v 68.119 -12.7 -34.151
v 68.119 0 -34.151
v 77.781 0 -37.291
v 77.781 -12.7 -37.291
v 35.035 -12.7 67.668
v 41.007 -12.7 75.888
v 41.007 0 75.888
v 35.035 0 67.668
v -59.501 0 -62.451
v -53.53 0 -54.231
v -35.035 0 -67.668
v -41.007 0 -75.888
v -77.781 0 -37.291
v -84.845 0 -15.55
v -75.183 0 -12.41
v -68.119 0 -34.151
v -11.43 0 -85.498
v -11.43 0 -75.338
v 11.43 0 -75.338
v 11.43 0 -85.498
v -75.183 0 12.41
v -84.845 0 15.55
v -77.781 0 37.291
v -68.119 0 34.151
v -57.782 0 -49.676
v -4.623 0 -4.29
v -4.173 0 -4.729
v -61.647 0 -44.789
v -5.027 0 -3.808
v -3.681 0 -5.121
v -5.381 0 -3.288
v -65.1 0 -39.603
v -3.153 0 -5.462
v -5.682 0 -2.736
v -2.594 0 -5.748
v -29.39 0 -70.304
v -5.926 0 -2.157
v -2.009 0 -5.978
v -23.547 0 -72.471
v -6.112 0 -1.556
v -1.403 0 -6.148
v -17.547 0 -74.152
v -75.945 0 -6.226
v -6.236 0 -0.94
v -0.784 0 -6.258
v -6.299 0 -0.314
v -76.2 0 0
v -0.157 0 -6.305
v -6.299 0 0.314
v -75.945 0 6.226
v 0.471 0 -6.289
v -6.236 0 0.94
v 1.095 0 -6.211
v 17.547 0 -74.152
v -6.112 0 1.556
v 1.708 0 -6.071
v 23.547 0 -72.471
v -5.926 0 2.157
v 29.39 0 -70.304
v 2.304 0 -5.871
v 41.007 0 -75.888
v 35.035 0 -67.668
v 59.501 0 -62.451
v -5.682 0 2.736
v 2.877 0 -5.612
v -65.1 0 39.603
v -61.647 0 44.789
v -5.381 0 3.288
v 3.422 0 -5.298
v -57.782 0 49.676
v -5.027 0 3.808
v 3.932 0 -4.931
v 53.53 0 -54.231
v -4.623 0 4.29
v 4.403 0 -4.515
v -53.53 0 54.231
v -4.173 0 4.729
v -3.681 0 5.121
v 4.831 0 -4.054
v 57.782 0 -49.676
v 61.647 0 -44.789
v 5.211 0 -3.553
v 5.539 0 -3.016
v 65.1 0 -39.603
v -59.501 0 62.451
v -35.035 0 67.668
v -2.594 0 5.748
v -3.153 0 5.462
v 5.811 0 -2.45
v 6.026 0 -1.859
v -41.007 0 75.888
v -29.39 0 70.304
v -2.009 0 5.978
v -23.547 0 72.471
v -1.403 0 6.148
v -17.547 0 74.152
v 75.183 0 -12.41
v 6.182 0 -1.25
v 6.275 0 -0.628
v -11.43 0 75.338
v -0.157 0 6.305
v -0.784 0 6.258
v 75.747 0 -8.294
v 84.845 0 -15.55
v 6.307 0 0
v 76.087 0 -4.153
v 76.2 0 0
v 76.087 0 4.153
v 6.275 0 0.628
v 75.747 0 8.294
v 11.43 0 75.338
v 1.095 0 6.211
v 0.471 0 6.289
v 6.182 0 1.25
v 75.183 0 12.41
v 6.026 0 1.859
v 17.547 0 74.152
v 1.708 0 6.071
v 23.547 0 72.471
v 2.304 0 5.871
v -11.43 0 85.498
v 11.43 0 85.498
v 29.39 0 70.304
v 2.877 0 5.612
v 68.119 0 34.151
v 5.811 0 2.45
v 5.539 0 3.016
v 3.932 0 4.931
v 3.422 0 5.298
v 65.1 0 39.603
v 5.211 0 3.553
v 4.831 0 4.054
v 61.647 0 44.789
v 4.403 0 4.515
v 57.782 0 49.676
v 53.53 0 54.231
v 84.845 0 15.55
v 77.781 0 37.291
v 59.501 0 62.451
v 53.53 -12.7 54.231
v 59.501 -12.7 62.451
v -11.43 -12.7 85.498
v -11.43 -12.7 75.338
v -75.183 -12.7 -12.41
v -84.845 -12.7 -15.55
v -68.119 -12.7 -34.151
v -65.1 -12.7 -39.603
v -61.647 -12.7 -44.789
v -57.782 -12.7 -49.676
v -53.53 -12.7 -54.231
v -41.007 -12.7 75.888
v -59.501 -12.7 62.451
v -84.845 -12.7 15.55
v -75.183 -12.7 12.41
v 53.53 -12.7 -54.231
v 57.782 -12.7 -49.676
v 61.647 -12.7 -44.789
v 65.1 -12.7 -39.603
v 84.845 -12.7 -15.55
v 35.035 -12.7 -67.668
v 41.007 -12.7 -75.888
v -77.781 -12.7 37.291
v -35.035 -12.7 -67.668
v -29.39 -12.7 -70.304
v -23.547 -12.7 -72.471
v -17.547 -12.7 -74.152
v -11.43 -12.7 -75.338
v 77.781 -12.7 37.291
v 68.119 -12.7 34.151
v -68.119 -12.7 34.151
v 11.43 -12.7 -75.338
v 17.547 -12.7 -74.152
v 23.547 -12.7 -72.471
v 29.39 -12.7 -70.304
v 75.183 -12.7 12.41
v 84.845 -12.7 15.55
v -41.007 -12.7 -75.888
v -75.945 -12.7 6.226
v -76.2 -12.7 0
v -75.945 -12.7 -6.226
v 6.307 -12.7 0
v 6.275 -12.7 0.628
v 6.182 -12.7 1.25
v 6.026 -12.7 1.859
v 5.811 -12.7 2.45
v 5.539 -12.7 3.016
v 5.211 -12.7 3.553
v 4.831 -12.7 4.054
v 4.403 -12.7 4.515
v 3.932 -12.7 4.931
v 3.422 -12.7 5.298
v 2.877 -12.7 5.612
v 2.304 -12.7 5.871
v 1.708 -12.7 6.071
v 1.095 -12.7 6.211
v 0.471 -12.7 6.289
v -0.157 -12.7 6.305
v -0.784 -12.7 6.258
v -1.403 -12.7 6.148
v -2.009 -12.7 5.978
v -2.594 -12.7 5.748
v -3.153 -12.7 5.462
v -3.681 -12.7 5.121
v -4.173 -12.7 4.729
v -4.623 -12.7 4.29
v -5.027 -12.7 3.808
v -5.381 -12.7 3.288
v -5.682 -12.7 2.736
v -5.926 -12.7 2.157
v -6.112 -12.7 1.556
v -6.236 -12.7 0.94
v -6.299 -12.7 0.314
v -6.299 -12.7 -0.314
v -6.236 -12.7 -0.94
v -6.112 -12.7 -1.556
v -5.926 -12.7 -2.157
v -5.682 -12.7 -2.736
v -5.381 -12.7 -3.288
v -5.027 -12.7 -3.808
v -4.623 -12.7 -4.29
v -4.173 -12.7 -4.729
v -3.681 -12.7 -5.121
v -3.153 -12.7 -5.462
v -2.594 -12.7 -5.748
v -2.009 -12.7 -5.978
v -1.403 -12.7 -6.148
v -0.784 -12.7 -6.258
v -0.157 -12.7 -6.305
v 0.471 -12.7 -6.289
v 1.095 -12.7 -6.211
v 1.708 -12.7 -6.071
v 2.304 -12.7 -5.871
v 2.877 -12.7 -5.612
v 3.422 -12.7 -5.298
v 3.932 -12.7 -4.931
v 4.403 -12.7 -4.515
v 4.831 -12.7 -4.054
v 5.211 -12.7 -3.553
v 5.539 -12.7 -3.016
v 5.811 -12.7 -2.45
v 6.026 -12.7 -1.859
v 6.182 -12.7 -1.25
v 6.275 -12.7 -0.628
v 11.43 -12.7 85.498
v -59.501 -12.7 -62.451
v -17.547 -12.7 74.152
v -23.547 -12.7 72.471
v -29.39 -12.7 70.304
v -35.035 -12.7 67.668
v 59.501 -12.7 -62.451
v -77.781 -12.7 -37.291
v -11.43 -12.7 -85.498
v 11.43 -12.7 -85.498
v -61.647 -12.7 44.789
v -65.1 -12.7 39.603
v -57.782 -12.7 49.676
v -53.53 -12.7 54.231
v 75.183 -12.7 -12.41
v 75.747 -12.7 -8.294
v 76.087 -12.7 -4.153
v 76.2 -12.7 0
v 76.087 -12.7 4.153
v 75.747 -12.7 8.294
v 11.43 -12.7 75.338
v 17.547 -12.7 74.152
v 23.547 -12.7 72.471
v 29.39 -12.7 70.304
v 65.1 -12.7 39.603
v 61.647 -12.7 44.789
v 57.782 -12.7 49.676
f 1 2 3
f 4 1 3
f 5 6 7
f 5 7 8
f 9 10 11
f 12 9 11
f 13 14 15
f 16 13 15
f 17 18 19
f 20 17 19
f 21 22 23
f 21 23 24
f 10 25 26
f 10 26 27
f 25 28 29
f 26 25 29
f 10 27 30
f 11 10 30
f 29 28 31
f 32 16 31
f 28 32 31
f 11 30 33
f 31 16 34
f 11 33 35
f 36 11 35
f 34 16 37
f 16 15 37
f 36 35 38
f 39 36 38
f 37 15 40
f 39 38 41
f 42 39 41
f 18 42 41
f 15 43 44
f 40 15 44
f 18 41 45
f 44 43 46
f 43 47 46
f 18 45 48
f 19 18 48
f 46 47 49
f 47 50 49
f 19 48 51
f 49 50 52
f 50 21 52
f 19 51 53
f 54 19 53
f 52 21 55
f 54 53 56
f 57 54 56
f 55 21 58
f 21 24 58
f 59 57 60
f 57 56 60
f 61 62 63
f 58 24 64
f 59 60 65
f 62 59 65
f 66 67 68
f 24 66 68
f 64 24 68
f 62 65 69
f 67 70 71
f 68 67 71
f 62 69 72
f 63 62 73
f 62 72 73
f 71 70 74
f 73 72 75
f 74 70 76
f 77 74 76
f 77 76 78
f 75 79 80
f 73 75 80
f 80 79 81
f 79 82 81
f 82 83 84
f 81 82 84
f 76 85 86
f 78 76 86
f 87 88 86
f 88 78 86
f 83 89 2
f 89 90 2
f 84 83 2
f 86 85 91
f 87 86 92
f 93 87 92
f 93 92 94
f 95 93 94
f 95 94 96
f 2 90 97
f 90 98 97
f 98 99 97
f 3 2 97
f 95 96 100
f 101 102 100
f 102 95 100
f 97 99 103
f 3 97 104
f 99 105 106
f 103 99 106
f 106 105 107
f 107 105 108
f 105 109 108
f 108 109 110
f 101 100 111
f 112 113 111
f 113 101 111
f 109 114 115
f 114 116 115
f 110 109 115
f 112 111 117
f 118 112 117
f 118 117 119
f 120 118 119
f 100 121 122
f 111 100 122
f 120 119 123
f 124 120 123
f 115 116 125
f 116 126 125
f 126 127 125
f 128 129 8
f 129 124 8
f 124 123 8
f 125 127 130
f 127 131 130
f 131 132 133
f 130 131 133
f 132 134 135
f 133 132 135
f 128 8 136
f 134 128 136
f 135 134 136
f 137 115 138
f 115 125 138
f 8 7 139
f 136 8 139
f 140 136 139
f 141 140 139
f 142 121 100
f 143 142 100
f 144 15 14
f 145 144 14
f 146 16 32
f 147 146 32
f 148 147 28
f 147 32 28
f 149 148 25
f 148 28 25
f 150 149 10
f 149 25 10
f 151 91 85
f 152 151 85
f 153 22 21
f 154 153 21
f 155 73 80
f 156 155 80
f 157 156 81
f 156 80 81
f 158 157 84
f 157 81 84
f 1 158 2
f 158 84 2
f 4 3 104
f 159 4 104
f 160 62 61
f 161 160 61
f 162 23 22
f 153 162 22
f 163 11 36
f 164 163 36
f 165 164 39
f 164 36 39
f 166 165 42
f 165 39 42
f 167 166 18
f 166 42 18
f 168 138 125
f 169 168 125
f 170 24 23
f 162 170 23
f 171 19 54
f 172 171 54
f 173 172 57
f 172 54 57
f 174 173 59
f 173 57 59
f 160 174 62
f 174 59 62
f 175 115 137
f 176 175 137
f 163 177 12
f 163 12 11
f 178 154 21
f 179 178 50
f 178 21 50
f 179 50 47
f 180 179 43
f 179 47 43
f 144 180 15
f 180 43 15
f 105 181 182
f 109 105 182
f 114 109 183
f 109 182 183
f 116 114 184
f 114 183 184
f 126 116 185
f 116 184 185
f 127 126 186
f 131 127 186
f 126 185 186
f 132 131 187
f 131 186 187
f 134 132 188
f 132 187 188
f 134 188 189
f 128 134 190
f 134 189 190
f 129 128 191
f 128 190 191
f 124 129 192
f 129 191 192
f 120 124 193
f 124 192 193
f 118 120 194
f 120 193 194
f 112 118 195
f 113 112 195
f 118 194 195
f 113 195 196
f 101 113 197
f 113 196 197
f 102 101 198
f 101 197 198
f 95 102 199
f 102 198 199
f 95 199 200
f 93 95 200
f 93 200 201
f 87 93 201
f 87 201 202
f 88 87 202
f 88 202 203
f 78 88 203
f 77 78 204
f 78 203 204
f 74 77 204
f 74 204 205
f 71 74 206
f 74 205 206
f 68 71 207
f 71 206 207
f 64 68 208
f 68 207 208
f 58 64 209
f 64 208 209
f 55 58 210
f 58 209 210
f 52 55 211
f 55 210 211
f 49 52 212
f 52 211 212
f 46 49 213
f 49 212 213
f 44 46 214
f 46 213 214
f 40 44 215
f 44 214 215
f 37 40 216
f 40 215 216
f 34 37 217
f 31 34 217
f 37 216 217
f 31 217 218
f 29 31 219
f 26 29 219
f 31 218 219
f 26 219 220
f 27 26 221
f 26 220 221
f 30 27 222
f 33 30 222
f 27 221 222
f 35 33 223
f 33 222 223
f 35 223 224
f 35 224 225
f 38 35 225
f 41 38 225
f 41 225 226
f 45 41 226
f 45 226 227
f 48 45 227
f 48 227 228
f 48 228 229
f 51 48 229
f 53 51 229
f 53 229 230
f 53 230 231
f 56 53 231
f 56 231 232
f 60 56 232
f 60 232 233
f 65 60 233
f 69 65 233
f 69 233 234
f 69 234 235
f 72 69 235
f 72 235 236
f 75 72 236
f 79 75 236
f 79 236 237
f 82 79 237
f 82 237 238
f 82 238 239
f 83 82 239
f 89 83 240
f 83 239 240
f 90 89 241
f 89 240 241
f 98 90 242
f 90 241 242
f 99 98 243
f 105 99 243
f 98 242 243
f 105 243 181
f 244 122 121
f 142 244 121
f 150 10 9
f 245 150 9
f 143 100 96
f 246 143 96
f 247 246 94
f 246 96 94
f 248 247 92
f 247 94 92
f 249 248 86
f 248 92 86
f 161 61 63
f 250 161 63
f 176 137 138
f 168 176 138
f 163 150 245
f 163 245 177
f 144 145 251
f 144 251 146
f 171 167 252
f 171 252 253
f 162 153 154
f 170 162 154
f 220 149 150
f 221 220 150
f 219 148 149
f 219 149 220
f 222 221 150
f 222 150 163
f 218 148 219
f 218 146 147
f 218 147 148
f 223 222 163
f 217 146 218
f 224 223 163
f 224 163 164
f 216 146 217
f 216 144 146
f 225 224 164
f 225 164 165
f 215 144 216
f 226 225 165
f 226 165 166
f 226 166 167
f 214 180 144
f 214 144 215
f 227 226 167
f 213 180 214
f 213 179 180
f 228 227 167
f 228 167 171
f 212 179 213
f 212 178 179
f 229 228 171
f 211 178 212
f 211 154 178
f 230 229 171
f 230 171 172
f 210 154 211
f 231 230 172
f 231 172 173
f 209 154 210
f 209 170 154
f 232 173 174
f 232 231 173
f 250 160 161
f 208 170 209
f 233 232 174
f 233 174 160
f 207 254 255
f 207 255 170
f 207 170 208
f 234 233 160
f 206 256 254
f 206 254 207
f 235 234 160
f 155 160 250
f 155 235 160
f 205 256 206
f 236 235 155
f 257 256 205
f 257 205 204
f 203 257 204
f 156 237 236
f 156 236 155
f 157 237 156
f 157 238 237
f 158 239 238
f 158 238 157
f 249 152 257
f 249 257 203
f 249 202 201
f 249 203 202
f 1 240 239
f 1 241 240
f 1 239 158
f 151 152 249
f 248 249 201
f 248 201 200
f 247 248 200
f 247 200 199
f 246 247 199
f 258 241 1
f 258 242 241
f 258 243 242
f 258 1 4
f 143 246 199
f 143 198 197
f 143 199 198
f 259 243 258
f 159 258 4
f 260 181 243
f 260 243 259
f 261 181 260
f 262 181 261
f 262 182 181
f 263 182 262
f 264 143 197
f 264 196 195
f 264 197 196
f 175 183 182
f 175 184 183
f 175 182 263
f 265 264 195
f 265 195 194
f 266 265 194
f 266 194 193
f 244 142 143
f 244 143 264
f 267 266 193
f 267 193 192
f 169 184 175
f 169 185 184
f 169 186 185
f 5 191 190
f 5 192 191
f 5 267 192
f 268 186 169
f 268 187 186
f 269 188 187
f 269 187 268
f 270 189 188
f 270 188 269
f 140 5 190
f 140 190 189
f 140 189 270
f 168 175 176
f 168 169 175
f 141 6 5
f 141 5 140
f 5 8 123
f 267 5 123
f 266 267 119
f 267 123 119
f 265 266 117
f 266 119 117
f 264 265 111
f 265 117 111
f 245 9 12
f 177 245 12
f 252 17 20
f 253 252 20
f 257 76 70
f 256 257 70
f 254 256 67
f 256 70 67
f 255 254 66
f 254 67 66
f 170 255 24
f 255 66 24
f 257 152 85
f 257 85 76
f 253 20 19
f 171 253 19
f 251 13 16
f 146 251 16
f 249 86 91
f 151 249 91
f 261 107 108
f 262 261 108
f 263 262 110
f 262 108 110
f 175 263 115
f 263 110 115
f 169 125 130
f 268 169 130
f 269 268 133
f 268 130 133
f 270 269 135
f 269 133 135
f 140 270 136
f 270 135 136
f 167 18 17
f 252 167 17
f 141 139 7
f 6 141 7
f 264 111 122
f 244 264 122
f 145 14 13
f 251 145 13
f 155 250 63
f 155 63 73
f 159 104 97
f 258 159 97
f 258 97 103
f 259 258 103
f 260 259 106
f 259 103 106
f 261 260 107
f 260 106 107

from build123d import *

# Parameters (mm, degrees)
F1_DEPTH = 12.7
F2_R     = 6.3065615495
F3_DEPTH = 12.7


with BuildPart() as f1:
    # F0 (on Front) → F1 (new body)
    with BuildSketch(Plane.XZ):
        with BuildLine():
            ThreePointArc((75.1826392346, -12.4101070791), (75.9452339179, -6.2258690285), (76.2, 0))
            ThreePointArc((76.2, 0), (75.9452339179, 6.2258690285), (75.1826392346, 12.4101070791))
            ThreePointArc((75.1826392346, 12.4101070791), (72.4705065417, 23.5470949714), (68.1185107432, 34.1512590416))
            ThreePointArc((68.1185107432, 34.1512590416), (61.6470949714, 44.7892362247), (53.5295549023, 54.2312340995))
            ThreePointArc((53.5295549023, 54.2312340995), (44.7892362247, 61.6470949714), (35.0354264109, 67.6680049669))
            ThreePointArc((35.0354264109, 67.6680049669), (23.5470949714, 72.4705065417), (11.43, 75.3378729458))
            Line((11.43, 75.3378729458), (-11.43, 75.3378729458))
            ThreePointArc((-11.43, 75.3378729458), (-23.5470949714, 72.4705065417), (-35.0354264109, 67.6680049669))
            ThreePointArc((-35.0354264109, 67.6680049669), (-44.7892362247, 61.6470949714), (-53.5295549023, 54.2312340995))
            ThreePointArc((-53.5295549023, 54.2312340995), (-61.6470949714, 44.7892362247), (-68.1185107432, 34.1512590416))
            ThreePointArc((-68.1185107432, 34.1512590416), (-72.4705065417, 23.5470949714), (-75.1826392346, 12.4101070791))
            ThreePointArc((-75.1826392346, 12.4101070791), (-76.2, 0), (-75.1826392346, -12.4101070791))
            ThreePointArc((-75.1826392346, -12.4101070791), (-72.4705065417, -23.5470949714), (-68.1185107432, -34.1512590416))
            ThreePointArc((-68.1185107432, -34.1512590416), (-61.6470949714, -44.7892362247), (-53.5295549023, -54.2312340995))
            ThreePointArc((-53.5295549023, -54.2312340995), (-44.7892362247, -61.6470949714), (-35.0354264109, -67.6680049669))
            ThreePointArc((-35.0354264109, -67.6680049669), (-23.5470949714, -72.4705065417), (-11.43, -75.3378729458))
            ThreePointArc((-11.43, -75.3378729458), (0, -76.2), (11.43, -75.3378729458))
            ThreePointArc((11.43, -75.3378729458), (23.5470949714, -72.4705065417), (35.0354264109, -67.6680049669))
            ThreePointArc((35.0354264109, -67.6680049669), (44.7892362247, -61.6470949714), (53.5295549023, -54.2312340995))
            ThreePointArc((53.5295549023, -54.2312340995), (61.6470949714, -44.7892362247), (68.1185107432, -34.1512590416))
            ThreePointArc((68.1185107432, -34.1512590416), (72.4705065417, -23.5470949714), (75.1826392346, -12.4101070791))
        make_face()
        with BuildLine():
            ThreePointArc((68.1185107432, 34.1512590416), (72.4705065417, 23.5470949714), (75.1826392346, 12.4101070791))
            Line((75.1826392346, 12.4101070791), (84.8453734402, 15.5497197419))
            Line((84.8453734402, 15.5497197419), (77.7812449488, 37.2908717044))
            Line((77.7812449488, 37.2908717044), (68.1185107432, 34.1512590416))
        make_face()
        with BuildLine():
            Line((84.8453734402, -15.5497197419), (75.1826392346, -12.4101070791))
            ThreePointArc((75.1826392346, -12.4101070791), (72.4705065417, -23.5470949714), (68.1185107432, -34.1512590416))
            Line((68.1185107432, -34.1512590416), (77.7812449488, -37.2908717044))
            Line((77.7812449488, -37.2908717044), (84.8453734402, -15.5497197419))
        make_face()
        with BuildLine():
            ThreePointArc((35.0354264109, 67.6680049669), (44.7892362247, 61.6470949714), (53.5295549023, 54.2312340995))
            Line((53.5295549023, 54.2312340995), (59.5014530656, 62.4508467624))
            Line((59.5014530656, 62.4508467624), (41.0073245742, 75.8876176298))
            Line((41.0073245742, 75.8876176298), (35.0354264109, 67.6680049669))
        make_face()
        with BuildLine():
            Line((59.5014530656, -62.4508467624), (53.5295549023, -54.2312340995))
            ThreePointArc((53.5295549023, -54.2312340995), (44.7892362247, -61.6470949714), (35.0354264109, -67.6680049669))
            Line((35.0354264109, -67.6680049669), (41.0073245742, -75.8876176298))
            Line((41.0073245742, -75.8876176298), (59.5014530656, -62.4508467624))
        make_face()
        with BuildLine():
            Line((-11.43, 75.3378729458), (11.43, 75.3378729458))
            ThreePointArc((11.43, 75.3378729458), (0, 76.2), (-11.43, 75.3378729458))
        make_face()
        with BuildLine():
            ThreePointArc((-11.43, 75.3378729458), (0, 76.2), (11.43, 75.3378729458))
            Line((11.43, 75.3378729458), (11.43, 85.4978729458))
            Line((11.43, 85.4978729458), (-11.43, 85.4978729458))
            Line((-11.43, 85.4978729458), (-11.43, 75.3378729458))
        make_face()
        with BuildLine():
            Line((11.43, -85.4978729458), (11.43, -75.3378729458))
            ThreePointArc((11.43, -75.3378729458), (0, -76.2), (-11.43, -75.3378729458))
            Line((-11.43, -75.3378729458), (-11.43, -85.4978729458))
            Line((-11.43, -85.4978729458), (11.43, -85.4978729458))
        make_face()
        with BuildLine():
            ThreePointArc((-53.5295549023, 54.2312340995), (-44.7892362247, 61.6470949714), (-35.0354264109, 67.6680049669))
            Line((-35.0354264109, 67.6680049669), (-41.0073245742, 75.8876176298))
            Line((-41.0073245742, 75.8876176298), (-59.5014530656, 62.4508467624))
            Line((-59.5014530656, 62.4508467624), (-53.5295549023, 54.2312340995))
        make_face()
        with BuildLine():
            Line((-41.0073245742, -75.8876176298), (-35.0354264109, -67.6680049669))
            ThreePointArc((-35.0354264109, -67.6680049669), (-44.7892362247, -61.6470949714), (-53.5295549023, -54.2312340995))
            Line((-53.5295549023, -54.2312340995), (-59.5014530656, -62.4508467624))
            Line((-59.5014530656, -62.4508467624), (-41.0073245742, -75.8876176298))
        make_face()
        with BuildLine():
            ThreePointArc((-75.1826392346, 12.4101070791), (-72.4705065417, 23.5470949714), (-68.1185107432, 34.1512590416))
            Line((-68.1185107432, 34.1512590416), (-77.7812449488, 37.2908717044))
            Line((-77.7812449488, 37.2908717044), (-84.8453734402, 15.5497197419))
            Line((-84.8453734402, 15.5497197419), (-75.1826392346, 12.4101070791))
        make_face()
        with BuildLine():
            Line((-77.7812449488, -37.2908717044), (-68.1185107432, -34.1512590416))
            ThreePointArc((-68.1185107432, -34.1512590416), (-72.4705065417, -23.5470949714), (-75.1826392346, -12.4101070791))
            Line((-75.1826392346, -12.4101070791), (-84.8453734402, -15.5497197419))
            Line((-84.8453734402, -15.5497197419), (-77.7812449488, -37.2908717044))
        make_face()
    extrude(amount=F1_DEPTH)

    # F2 (on face) → F3 (cut)
    with BuildSketch(Plane.XZ.offset(12.7)):
        Circle(F2_R)
    extrude(amount=-F3_DEPTH, mode=Mode.SUBTRACT)


solid = f1.part
